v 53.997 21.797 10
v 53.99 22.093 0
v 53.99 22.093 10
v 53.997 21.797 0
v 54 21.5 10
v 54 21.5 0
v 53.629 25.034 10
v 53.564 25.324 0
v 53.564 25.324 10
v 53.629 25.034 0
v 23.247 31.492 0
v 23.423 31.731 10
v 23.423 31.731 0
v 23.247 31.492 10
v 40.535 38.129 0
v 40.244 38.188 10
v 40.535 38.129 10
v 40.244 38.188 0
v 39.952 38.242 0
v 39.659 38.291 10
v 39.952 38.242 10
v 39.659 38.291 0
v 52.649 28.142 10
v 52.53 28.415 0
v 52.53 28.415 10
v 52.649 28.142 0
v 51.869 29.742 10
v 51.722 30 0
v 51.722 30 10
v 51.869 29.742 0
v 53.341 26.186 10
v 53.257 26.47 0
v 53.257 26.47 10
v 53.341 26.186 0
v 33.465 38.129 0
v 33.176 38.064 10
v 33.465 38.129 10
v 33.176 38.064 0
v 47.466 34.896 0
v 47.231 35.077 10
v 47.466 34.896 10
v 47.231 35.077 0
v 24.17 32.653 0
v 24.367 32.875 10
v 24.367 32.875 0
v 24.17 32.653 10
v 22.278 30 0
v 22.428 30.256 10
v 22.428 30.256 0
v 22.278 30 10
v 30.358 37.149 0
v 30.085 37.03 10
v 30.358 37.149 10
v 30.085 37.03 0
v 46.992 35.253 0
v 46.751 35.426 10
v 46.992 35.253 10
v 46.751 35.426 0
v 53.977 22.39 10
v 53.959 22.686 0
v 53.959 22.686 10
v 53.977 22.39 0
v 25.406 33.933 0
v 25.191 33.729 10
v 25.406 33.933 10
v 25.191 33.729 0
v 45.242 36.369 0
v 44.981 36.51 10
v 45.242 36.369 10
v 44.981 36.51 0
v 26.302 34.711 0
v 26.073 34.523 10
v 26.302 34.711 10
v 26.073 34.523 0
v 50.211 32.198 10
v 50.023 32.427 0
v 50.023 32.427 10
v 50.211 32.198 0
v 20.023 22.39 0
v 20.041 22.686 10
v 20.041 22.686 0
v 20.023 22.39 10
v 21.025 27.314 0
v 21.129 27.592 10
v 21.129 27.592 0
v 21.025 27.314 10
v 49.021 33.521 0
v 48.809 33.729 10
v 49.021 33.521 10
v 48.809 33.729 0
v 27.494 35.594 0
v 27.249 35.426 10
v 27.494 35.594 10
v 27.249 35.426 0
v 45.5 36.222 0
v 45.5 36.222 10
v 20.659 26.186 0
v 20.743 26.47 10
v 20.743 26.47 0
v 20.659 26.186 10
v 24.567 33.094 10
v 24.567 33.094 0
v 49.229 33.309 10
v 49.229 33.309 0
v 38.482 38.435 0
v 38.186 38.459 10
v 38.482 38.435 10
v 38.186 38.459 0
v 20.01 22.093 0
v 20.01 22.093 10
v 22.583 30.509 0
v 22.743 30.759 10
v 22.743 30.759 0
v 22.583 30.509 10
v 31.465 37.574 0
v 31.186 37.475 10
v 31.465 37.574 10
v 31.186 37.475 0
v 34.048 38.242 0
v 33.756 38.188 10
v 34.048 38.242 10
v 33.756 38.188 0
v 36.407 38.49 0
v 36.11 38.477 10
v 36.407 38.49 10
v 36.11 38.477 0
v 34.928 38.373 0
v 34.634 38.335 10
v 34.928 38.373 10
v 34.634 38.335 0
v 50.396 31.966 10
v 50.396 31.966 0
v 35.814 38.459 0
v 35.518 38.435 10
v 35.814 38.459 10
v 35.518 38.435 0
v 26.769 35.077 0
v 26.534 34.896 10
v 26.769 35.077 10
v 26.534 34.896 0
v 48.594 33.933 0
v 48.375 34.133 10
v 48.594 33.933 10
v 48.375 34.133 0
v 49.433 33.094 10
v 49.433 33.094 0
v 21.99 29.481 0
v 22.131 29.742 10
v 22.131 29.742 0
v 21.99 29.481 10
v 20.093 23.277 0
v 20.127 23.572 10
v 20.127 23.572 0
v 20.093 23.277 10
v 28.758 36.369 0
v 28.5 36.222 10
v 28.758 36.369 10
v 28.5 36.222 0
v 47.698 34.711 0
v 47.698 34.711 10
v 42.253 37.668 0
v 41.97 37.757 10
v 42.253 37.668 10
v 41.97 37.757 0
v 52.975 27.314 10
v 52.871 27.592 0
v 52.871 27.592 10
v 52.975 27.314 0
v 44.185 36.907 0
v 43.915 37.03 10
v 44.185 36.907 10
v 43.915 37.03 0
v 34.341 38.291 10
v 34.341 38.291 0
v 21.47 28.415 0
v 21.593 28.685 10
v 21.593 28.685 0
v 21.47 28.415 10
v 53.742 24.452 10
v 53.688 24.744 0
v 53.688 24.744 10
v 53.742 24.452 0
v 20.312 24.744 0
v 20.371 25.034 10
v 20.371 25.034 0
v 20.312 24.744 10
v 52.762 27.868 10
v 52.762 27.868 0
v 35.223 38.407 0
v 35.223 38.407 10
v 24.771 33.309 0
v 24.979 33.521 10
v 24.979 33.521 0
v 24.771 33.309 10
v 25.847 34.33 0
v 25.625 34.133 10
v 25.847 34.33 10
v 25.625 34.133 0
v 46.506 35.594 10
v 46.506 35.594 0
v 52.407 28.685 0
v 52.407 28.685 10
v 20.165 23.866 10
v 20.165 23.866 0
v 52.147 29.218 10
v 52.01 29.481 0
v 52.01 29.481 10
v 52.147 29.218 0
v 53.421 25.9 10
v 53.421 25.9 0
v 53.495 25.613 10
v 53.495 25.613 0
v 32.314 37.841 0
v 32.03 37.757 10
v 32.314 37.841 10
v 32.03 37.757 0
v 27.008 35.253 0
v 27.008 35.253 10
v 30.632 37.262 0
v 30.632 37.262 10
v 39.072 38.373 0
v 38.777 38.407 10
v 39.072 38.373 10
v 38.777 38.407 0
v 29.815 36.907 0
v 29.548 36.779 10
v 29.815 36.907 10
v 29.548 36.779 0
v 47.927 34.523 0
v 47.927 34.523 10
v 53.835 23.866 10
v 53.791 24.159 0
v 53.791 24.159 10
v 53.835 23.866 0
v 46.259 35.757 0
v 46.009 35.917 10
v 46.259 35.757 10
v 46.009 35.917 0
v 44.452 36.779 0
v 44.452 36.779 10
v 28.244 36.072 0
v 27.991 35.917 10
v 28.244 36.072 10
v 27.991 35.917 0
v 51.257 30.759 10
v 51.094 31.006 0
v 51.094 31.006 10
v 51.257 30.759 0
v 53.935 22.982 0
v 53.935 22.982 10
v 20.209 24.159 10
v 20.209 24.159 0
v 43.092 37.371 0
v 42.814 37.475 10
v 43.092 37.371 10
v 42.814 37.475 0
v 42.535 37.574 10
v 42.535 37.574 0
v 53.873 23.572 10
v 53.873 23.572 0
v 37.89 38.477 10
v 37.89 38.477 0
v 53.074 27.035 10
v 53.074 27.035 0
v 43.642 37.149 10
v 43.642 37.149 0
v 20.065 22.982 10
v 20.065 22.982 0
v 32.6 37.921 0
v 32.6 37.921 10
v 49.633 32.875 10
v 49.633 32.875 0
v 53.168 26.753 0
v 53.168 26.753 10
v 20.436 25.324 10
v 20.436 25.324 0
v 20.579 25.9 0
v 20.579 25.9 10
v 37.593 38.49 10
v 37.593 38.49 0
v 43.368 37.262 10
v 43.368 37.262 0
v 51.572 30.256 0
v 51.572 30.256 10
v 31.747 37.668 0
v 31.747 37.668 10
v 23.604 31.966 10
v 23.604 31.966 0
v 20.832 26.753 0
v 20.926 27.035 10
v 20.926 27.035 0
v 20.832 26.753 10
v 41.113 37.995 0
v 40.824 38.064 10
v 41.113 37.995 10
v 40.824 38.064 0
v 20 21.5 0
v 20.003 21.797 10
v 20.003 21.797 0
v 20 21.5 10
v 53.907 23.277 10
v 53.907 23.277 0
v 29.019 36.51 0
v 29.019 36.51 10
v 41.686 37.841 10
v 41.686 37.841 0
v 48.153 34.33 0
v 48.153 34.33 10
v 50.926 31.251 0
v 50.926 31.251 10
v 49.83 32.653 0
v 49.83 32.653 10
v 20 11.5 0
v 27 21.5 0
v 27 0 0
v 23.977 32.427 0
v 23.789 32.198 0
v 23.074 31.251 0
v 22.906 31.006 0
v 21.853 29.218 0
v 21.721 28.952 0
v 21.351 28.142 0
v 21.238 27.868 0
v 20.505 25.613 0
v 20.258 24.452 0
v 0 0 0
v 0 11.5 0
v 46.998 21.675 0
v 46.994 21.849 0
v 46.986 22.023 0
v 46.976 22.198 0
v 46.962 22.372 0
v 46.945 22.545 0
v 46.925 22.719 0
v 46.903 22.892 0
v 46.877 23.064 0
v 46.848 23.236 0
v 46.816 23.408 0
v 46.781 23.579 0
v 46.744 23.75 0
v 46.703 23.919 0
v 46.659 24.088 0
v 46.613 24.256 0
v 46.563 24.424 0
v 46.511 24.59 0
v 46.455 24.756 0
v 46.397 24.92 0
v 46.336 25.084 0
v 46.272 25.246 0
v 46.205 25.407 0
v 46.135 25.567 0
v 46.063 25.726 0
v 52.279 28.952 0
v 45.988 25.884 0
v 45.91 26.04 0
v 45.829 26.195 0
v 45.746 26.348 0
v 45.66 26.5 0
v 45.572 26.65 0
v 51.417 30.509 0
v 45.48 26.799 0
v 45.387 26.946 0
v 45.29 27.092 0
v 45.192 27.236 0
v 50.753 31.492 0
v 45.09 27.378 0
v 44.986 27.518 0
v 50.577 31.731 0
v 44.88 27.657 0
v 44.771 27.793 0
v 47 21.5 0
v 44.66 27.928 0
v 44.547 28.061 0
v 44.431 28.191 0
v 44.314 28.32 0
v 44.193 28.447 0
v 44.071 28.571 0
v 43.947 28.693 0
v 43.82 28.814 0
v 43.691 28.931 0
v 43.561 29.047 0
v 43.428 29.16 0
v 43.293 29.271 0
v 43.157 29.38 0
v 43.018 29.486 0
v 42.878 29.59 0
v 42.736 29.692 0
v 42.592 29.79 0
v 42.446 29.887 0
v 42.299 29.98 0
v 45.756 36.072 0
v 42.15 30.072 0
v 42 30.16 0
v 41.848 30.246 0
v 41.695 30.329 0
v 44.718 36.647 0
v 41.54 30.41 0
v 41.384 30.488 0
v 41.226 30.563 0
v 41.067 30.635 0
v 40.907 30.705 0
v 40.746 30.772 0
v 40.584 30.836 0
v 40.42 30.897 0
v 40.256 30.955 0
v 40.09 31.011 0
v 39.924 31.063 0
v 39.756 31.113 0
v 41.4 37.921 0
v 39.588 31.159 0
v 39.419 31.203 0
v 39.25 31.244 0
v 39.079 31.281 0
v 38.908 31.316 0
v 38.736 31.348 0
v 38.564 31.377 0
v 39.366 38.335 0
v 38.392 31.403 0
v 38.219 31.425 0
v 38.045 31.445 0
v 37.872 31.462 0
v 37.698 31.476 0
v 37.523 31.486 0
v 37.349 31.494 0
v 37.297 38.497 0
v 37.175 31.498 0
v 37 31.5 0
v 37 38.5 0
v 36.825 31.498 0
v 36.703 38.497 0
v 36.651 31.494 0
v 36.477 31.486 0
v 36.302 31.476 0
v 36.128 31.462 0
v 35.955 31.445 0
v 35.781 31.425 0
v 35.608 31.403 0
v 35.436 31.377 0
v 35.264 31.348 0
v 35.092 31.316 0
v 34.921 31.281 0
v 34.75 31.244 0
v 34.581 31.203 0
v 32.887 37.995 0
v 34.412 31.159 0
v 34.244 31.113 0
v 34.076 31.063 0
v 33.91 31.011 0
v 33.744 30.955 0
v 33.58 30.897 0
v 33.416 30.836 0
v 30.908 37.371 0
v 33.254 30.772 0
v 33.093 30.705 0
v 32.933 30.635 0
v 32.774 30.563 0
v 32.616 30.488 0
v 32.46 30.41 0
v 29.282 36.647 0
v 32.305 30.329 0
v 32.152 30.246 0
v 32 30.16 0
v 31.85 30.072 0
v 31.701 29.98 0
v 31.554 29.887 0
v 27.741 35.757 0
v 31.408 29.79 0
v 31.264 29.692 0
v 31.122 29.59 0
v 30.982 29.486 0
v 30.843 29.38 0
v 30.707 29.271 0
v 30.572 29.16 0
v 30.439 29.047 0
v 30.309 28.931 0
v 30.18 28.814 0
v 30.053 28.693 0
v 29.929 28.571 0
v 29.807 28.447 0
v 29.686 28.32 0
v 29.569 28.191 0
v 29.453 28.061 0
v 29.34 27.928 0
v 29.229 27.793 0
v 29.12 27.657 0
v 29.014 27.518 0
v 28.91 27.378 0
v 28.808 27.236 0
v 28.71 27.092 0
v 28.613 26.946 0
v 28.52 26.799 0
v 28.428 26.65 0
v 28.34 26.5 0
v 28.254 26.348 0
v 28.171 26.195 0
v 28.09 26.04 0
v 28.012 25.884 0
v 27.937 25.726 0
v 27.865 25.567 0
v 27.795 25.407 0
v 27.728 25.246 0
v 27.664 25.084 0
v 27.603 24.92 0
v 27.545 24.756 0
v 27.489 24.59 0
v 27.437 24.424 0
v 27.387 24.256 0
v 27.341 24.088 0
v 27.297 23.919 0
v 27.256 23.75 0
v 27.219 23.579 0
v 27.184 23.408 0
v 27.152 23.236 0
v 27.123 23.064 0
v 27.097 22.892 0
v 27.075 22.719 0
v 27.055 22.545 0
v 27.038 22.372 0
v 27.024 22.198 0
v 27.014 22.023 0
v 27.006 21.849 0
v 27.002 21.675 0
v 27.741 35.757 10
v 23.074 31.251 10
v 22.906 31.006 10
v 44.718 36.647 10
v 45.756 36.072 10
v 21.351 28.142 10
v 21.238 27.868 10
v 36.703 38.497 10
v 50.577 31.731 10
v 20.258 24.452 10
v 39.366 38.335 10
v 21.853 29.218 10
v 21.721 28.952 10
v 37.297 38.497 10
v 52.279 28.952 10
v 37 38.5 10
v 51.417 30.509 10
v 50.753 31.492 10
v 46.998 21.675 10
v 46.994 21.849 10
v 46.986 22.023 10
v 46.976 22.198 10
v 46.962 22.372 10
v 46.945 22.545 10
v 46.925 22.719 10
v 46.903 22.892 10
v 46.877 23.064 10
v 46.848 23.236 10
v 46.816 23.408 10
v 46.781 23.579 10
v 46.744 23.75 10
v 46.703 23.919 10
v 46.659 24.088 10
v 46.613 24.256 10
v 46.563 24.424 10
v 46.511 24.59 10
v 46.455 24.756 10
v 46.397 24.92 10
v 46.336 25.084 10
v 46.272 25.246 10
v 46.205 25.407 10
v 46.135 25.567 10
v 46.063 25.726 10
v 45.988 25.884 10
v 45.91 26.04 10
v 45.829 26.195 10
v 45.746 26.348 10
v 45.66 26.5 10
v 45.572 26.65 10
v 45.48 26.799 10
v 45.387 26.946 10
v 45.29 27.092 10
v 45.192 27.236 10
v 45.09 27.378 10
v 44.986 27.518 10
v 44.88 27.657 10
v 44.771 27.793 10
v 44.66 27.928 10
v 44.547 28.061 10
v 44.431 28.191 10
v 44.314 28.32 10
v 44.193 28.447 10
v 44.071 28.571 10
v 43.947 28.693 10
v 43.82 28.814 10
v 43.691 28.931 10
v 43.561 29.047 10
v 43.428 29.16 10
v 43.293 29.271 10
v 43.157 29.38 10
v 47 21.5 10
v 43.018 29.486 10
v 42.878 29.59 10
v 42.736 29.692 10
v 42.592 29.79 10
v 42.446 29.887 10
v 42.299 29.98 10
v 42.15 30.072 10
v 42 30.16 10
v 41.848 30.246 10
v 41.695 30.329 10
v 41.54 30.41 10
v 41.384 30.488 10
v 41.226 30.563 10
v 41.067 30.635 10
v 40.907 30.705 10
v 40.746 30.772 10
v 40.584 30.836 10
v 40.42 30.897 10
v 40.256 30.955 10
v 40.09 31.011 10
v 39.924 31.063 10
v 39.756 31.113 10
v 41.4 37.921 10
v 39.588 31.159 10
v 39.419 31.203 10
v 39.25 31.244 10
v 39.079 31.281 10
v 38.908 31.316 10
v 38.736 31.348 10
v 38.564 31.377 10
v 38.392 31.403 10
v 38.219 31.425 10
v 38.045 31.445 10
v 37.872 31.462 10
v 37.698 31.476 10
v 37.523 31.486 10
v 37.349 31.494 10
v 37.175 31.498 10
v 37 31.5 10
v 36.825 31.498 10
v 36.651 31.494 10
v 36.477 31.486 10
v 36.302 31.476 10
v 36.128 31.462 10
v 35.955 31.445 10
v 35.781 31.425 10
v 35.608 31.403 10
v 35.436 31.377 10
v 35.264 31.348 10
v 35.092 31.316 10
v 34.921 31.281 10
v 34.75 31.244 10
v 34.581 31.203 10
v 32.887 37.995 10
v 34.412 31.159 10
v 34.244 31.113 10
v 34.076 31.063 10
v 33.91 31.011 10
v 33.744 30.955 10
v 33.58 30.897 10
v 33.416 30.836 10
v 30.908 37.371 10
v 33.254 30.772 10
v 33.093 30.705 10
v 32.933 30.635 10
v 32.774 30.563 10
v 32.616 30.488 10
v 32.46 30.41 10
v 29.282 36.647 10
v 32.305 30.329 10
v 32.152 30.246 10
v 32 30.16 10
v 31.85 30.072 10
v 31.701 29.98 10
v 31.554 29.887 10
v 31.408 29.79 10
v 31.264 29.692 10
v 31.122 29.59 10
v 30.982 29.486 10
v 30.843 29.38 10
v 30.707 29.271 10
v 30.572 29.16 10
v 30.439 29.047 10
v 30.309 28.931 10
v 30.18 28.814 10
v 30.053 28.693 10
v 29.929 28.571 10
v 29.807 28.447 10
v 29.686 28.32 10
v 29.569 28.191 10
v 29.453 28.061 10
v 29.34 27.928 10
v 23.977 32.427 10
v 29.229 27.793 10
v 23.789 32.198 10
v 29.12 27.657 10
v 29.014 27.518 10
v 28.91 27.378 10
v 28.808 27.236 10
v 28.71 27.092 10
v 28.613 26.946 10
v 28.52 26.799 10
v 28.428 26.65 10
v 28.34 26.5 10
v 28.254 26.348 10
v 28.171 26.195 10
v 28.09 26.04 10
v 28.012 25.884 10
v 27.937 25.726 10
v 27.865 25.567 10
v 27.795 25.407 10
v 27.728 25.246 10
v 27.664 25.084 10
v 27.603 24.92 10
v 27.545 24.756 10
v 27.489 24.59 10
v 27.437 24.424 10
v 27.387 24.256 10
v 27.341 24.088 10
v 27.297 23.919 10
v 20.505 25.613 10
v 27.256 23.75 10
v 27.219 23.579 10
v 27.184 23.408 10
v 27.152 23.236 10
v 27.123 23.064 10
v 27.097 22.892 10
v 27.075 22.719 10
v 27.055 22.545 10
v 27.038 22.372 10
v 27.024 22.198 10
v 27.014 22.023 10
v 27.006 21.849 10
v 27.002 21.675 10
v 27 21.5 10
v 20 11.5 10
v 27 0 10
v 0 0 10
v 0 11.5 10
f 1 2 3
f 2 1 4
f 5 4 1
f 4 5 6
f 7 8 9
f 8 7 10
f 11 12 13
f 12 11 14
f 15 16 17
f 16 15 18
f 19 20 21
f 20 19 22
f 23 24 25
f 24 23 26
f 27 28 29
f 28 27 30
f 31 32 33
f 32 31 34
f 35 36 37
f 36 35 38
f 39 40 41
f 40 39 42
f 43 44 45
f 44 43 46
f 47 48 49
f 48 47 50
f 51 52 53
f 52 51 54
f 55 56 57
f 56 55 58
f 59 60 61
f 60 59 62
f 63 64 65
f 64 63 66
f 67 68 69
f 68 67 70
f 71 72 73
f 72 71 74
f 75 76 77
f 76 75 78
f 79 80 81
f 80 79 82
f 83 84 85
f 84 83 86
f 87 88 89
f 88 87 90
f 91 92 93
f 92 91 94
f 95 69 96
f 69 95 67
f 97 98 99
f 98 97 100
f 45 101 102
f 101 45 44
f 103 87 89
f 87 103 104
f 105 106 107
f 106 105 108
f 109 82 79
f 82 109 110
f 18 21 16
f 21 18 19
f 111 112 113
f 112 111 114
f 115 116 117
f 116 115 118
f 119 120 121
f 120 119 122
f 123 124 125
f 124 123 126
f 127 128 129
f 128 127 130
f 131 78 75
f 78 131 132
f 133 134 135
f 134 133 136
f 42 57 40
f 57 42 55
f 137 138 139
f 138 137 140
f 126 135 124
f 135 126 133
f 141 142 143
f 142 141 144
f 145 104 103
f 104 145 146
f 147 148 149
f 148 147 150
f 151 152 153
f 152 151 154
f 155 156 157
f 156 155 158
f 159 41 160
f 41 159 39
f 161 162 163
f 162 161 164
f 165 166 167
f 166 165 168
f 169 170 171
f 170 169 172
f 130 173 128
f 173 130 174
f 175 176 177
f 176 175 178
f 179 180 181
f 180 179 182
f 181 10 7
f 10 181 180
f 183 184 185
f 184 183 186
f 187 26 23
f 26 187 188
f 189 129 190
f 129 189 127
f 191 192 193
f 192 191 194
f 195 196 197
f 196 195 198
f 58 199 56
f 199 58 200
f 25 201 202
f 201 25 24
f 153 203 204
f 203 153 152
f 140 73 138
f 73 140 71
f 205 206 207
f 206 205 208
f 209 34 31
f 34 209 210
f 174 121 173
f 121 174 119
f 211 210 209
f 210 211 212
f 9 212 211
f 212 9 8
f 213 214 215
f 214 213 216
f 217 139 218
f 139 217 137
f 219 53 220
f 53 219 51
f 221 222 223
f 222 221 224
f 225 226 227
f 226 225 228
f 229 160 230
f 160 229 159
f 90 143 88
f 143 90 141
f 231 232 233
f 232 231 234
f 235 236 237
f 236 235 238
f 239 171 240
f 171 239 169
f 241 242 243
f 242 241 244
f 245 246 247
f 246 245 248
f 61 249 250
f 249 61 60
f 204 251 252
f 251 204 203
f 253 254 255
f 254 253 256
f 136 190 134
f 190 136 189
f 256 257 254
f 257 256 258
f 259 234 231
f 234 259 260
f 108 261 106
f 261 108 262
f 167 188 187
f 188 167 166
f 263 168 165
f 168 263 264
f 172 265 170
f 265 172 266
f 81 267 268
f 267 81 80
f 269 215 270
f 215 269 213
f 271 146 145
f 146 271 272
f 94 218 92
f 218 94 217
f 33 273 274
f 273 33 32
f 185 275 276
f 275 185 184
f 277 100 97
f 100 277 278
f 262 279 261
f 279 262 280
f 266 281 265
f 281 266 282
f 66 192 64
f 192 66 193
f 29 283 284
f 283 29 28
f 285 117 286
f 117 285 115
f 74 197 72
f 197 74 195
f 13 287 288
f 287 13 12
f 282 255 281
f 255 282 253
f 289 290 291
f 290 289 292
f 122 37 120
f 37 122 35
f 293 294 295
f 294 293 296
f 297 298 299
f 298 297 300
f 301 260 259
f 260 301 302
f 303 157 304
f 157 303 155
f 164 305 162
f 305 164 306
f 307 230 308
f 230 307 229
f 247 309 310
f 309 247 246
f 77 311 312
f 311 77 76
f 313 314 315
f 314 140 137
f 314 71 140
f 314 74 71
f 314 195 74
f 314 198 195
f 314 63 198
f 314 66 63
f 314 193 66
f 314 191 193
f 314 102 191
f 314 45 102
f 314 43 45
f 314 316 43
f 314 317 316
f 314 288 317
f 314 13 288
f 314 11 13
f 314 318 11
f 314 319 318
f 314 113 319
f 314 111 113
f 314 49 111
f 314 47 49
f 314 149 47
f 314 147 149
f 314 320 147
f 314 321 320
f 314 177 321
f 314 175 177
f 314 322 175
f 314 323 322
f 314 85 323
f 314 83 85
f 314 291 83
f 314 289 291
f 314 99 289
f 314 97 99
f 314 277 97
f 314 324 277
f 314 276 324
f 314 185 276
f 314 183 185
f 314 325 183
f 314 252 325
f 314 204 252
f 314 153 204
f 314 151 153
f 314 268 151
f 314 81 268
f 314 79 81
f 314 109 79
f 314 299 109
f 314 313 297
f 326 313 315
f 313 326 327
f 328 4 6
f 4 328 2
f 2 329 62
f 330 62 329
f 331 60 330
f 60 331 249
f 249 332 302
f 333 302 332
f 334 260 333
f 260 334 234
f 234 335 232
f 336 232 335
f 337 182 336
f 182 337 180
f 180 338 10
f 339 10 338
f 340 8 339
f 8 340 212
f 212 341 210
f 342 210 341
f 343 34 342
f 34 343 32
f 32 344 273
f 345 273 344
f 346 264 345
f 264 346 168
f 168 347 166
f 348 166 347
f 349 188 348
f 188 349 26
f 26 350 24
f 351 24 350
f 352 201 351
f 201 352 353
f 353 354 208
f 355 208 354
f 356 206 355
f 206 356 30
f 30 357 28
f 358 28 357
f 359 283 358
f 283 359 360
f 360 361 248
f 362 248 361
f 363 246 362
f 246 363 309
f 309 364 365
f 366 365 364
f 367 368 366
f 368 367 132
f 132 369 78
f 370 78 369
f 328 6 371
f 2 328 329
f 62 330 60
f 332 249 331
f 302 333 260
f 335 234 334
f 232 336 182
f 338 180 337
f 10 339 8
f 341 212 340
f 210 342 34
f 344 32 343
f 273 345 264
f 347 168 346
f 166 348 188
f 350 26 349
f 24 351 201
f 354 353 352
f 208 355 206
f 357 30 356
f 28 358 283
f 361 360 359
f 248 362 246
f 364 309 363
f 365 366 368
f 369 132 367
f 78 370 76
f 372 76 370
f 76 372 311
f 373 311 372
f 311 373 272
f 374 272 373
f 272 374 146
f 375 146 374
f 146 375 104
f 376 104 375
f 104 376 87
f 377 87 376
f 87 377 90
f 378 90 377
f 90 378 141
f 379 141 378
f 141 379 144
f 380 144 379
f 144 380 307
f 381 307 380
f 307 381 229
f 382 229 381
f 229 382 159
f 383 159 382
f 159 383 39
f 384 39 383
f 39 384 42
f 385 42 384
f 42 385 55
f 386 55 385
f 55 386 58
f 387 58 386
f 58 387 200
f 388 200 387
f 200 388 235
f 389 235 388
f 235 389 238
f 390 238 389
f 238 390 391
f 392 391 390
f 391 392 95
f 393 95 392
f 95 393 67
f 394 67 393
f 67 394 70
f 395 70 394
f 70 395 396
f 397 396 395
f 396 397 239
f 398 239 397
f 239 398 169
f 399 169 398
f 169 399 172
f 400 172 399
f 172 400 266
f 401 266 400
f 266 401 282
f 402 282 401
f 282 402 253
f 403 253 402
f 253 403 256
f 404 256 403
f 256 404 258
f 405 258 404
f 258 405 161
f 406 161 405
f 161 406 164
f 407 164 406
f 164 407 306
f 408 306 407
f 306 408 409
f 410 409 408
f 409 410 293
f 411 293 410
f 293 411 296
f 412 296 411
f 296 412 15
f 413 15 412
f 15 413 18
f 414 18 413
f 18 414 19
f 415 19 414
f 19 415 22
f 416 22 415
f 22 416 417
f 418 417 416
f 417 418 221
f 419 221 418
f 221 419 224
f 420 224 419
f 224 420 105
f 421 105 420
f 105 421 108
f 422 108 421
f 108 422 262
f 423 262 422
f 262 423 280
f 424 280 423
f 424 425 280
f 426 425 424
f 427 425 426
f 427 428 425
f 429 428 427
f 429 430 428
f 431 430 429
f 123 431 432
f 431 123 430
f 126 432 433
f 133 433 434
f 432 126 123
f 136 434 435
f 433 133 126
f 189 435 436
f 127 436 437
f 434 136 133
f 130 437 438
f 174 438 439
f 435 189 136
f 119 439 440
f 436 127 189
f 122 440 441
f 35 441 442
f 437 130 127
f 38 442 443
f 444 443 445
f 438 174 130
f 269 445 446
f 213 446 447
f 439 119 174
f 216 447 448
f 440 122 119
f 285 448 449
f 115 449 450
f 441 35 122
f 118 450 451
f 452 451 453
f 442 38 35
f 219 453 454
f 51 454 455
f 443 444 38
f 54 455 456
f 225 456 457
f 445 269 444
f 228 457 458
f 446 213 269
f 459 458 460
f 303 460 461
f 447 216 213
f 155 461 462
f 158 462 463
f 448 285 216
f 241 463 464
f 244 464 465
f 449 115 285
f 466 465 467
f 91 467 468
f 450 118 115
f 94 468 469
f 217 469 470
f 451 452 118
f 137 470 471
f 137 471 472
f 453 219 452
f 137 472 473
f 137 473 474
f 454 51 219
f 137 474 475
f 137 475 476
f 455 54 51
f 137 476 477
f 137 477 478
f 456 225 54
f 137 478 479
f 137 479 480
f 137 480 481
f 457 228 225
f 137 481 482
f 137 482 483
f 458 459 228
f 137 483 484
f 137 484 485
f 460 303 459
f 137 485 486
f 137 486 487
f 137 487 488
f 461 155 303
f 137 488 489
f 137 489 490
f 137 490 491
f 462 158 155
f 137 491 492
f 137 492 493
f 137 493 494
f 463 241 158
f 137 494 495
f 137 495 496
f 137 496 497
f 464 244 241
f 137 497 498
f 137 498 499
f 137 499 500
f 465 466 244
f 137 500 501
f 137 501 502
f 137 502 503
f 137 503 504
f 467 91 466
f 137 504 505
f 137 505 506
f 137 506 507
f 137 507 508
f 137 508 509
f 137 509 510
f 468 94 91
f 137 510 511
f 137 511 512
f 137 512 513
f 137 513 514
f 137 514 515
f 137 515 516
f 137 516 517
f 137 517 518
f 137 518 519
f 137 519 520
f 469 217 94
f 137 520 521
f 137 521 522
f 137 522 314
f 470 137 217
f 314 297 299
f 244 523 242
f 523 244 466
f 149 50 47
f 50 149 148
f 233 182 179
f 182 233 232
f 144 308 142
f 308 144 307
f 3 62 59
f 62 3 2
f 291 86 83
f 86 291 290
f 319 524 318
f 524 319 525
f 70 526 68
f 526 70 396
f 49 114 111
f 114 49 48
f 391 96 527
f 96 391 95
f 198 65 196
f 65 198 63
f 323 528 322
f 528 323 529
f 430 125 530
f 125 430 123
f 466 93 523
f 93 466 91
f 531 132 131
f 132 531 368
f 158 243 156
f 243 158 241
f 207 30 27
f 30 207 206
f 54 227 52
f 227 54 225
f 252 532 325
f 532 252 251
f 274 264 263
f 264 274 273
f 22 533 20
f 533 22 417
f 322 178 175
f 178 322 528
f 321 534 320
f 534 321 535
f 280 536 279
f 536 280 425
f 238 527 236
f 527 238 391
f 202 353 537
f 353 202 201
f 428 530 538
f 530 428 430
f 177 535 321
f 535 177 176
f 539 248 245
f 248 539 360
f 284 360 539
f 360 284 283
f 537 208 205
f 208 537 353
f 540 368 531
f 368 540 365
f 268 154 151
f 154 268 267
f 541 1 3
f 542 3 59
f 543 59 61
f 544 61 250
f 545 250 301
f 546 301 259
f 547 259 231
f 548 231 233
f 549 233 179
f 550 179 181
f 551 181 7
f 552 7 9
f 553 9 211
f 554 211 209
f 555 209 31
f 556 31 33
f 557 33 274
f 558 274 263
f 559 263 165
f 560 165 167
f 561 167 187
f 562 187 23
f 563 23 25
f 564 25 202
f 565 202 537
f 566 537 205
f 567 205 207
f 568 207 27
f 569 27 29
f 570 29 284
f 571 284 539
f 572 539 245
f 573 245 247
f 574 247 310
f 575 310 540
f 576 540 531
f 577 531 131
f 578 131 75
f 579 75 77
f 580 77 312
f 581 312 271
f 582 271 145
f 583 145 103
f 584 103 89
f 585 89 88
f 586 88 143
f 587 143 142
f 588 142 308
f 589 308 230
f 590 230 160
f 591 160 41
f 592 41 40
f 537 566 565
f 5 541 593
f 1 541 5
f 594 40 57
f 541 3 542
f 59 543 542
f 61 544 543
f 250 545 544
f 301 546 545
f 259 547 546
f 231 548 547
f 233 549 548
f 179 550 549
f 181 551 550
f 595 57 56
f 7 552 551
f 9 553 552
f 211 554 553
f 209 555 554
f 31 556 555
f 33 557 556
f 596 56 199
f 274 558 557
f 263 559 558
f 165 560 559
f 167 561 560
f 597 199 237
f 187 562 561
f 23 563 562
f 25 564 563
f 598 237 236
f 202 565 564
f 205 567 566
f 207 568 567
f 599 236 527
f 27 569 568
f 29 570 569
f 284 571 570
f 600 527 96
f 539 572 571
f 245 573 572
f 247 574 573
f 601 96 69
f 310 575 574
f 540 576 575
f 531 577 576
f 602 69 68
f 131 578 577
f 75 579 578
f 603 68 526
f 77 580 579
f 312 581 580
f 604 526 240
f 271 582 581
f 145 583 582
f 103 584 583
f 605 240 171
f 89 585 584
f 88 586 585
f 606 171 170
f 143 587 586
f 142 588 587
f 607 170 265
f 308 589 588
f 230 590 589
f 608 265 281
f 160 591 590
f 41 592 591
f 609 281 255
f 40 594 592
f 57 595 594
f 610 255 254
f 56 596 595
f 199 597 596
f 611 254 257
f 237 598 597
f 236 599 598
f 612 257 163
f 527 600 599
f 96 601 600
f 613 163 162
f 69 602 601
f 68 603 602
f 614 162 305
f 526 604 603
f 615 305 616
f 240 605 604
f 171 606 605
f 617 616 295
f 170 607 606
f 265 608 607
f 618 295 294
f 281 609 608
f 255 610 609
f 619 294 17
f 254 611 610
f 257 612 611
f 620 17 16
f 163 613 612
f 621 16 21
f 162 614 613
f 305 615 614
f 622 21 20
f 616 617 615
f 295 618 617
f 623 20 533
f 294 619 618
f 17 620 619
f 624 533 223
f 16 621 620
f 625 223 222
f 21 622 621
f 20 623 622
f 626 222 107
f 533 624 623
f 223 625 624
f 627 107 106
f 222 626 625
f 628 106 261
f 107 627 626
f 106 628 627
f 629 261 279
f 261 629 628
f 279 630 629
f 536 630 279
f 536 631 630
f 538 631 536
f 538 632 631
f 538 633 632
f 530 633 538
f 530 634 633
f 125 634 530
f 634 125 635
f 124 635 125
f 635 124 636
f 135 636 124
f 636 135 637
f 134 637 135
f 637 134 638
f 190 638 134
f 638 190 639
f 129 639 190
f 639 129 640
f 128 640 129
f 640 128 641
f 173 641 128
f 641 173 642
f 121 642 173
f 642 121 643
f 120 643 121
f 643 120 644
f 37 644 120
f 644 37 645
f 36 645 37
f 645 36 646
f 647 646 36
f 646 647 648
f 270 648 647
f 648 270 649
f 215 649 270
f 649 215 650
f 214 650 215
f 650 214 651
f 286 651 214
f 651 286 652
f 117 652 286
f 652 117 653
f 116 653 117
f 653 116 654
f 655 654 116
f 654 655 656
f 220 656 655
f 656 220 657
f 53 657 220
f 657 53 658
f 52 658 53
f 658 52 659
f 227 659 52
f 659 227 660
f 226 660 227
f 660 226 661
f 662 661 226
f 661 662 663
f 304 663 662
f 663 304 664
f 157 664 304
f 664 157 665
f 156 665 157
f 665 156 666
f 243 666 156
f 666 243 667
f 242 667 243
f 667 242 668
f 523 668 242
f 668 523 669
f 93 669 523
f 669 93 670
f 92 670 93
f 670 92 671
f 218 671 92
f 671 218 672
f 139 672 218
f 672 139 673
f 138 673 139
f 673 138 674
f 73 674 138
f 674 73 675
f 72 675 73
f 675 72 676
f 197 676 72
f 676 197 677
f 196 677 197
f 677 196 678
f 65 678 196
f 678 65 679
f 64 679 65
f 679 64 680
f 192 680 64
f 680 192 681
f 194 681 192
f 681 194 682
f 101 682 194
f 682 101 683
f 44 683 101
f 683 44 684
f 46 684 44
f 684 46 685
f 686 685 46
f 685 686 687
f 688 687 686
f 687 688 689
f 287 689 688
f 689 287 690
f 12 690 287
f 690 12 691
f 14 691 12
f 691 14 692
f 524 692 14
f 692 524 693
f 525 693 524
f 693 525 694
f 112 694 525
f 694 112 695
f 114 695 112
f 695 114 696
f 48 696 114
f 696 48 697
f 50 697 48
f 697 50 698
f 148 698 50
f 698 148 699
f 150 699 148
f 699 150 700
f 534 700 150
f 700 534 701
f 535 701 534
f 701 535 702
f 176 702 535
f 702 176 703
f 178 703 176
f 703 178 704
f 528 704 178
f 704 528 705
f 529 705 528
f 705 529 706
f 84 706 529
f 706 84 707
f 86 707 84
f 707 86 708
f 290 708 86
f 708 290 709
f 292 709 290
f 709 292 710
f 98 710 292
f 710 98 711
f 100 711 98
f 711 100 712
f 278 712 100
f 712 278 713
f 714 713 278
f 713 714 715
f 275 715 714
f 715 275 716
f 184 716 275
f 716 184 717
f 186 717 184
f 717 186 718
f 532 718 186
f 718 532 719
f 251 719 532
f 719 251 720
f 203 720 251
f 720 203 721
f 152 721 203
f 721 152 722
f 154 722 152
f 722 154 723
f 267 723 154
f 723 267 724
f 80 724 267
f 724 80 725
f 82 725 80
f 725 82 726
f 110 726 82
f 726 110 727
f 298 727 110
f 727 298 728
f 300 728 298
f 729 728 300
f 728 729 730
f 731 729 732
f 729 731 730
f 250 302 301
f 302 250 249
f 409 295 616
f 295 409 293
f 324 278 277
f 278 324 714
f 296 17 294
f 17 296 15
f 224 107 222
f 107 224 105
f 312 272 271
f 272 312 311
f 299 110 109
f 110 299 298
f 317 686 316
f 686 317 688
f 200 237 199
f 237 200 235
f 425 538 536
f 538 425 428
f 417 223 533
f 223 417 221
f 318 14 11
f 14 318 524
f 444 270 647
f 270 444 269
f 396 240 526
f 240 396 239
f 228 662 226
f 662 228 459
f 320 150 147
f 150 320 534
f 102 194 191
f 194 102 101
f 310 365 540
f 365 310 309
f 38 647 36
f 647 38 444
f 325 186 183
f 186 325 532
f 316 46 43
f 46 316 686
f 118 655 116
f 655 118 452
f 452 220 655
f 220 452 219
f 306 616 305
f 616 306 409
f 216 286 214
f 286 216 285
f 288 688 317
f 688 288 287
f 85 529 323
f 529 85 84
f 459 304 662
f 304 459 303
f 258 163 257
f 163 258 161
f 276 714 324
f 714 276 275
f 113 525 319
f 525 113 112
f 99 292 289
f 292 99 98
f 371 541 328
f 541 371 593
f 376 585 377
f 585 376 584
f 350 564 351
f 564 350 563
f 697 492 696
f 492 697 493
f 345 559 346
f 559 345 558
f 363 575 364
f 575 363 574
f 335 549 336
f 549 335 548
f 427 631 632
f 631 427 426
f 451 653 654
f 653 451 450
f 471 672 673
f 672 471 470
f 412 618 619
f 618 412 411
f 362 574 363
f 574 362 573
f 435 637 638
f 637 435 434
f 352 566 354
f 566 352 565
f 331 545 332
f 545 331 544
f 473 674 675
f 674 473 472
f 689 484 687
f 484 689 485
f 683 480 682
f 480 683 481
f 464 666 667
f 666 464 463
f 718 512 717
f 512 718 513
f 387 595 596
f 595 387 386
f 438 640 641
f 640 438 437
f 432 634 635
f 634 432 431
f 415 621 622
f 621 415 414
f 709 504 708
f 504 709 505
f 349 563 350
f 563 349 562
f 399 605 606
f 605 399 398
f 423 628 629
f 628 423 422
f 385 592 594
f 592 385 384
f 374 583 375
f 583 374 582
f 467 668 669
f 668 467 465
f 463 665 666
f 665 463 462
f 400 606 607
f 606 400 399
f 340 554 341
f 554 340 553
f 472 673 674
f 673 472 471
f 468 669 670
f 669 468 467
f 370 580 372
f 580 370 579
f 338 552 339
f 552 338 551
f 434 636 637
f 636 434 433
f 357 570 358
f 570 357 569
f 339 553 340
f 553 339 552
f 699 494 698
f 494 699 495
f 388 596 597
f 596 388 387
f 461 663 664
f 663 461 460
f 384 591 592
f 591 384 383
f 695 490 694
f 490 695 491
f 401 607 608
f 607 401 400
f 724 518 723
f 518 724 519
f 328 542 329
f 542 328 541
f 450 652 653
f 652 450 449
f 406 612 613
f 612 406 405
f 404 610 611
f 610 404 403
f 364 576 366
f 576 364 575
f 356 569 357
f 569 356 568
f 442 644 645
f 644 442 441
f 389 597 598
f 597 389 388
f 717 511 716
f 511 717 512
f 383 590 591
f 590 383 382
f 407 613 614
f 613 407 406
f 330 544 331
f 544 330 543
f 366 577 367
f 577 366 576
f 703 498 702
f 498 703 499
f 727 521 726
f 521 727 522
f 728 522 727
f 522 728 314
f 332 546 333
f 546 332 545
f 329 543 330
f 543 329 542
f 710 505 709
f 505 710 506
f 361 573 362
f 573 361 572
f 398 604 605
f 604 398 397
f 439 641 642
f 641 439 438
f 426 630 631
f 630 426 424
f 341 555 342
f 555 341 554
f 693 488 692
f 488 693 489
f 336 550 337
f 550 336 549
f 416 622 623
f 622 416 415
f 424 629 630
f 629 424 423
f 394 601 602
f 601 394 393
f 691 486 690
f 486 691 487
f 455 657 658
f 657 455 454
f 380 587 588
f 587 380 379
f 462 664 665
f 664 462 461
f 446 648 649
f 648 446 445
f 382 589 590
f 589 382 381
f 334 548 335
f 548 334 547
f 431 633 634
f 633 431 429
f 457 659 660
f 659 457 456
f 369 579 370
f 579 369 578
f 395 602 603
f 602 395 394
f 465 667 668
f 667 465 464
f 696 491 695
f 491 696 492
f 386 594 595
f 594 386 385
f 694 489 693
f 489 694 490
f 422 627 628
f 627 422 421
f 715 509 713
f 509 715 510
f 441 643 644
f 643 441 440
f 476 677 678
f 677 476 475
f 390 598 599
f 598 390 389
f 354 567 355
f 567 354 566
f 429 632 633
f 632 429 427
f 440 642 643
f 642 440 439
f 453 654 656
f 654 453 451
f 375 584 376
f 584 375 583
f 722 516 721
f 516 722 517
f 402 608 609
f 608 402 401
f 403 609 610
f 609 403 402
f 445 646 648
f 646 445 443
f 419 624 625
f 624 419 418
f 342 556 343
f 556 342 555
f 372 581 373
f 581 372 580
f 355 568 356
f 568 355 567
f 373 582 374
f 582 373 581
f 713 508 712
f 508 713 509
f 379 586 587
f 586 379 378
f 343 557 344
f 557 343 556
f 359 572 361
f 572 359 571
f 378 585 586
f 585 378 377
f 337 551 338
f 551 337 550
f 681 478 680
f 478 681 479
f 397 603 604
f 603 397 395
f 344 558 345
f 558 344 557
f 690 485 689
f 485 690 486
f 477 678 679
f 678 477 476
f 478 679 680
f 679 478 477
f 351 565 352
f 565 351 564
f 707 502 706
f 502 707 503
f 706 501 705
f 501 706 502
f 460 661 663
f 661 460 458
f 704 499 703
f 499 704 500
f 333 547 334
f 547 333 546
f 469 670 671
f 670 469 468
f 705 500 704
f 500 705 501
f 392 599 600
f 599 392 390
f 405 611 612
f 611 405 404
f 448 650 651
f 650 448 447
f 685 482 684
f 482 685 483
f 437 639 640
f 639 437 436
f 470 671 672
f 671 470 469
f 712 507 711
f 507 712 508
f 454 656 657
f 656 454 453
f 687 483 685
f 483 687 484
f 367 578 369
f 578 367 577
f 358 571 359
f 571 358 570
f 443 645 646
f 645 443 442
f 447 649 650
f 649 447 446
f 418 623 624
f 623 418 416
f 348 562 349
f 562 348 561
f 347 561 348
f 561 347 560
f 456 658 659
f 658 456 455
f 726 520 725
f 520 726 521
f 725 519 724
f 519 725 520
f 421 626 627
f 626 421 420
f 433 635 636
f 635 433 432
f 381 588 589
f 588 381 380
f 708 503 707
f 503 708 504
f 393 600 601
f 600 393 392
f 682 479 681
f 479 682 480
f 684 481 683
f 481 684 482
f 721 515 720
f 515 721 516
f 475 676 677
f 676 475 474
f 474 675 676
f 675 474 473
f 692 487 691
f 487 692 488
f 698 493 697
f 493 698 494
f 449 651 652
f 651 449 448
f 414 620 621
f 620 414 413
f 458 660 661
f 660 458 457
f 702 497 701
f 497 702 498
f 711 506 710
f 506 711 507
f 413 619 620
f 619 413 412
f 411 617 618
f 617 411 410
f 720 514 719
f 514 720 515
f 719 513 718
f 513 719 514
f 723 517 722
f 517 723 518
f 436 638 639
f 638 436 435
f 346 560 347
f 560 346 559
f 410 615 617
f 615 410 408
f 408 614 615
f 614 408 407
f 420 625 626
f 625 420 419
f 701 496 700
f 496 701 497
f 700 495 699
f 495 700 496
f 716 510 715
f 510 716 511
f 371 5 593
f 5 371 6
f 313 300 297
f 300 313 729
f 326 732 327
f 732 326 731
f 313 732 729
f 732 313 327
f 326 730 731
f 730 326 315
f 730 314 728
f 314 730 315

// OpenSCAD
width = 10;
gap_size = 11.5;
grab_depth = 20;
thickness = 7;
radius = 10;
$fn = 360;

cube([grab_depth, gap_size, width]);
translate([grab_depth, 0, 0]) {
    cube([thickness, gap_size + radius, width]);
}
translate([grab_depth + thickness + radius, gap_size + radius, 0]) {
    difference() {
        cylinder(r = radius + thickness, h = width);
        cylinder(r = radius, h = width);
        translate([-radius - thickness, -radius - thickness, 0]) {
            cube([(radius + thickness) * 2, radius + thickness, width]);
        }
    }
}
